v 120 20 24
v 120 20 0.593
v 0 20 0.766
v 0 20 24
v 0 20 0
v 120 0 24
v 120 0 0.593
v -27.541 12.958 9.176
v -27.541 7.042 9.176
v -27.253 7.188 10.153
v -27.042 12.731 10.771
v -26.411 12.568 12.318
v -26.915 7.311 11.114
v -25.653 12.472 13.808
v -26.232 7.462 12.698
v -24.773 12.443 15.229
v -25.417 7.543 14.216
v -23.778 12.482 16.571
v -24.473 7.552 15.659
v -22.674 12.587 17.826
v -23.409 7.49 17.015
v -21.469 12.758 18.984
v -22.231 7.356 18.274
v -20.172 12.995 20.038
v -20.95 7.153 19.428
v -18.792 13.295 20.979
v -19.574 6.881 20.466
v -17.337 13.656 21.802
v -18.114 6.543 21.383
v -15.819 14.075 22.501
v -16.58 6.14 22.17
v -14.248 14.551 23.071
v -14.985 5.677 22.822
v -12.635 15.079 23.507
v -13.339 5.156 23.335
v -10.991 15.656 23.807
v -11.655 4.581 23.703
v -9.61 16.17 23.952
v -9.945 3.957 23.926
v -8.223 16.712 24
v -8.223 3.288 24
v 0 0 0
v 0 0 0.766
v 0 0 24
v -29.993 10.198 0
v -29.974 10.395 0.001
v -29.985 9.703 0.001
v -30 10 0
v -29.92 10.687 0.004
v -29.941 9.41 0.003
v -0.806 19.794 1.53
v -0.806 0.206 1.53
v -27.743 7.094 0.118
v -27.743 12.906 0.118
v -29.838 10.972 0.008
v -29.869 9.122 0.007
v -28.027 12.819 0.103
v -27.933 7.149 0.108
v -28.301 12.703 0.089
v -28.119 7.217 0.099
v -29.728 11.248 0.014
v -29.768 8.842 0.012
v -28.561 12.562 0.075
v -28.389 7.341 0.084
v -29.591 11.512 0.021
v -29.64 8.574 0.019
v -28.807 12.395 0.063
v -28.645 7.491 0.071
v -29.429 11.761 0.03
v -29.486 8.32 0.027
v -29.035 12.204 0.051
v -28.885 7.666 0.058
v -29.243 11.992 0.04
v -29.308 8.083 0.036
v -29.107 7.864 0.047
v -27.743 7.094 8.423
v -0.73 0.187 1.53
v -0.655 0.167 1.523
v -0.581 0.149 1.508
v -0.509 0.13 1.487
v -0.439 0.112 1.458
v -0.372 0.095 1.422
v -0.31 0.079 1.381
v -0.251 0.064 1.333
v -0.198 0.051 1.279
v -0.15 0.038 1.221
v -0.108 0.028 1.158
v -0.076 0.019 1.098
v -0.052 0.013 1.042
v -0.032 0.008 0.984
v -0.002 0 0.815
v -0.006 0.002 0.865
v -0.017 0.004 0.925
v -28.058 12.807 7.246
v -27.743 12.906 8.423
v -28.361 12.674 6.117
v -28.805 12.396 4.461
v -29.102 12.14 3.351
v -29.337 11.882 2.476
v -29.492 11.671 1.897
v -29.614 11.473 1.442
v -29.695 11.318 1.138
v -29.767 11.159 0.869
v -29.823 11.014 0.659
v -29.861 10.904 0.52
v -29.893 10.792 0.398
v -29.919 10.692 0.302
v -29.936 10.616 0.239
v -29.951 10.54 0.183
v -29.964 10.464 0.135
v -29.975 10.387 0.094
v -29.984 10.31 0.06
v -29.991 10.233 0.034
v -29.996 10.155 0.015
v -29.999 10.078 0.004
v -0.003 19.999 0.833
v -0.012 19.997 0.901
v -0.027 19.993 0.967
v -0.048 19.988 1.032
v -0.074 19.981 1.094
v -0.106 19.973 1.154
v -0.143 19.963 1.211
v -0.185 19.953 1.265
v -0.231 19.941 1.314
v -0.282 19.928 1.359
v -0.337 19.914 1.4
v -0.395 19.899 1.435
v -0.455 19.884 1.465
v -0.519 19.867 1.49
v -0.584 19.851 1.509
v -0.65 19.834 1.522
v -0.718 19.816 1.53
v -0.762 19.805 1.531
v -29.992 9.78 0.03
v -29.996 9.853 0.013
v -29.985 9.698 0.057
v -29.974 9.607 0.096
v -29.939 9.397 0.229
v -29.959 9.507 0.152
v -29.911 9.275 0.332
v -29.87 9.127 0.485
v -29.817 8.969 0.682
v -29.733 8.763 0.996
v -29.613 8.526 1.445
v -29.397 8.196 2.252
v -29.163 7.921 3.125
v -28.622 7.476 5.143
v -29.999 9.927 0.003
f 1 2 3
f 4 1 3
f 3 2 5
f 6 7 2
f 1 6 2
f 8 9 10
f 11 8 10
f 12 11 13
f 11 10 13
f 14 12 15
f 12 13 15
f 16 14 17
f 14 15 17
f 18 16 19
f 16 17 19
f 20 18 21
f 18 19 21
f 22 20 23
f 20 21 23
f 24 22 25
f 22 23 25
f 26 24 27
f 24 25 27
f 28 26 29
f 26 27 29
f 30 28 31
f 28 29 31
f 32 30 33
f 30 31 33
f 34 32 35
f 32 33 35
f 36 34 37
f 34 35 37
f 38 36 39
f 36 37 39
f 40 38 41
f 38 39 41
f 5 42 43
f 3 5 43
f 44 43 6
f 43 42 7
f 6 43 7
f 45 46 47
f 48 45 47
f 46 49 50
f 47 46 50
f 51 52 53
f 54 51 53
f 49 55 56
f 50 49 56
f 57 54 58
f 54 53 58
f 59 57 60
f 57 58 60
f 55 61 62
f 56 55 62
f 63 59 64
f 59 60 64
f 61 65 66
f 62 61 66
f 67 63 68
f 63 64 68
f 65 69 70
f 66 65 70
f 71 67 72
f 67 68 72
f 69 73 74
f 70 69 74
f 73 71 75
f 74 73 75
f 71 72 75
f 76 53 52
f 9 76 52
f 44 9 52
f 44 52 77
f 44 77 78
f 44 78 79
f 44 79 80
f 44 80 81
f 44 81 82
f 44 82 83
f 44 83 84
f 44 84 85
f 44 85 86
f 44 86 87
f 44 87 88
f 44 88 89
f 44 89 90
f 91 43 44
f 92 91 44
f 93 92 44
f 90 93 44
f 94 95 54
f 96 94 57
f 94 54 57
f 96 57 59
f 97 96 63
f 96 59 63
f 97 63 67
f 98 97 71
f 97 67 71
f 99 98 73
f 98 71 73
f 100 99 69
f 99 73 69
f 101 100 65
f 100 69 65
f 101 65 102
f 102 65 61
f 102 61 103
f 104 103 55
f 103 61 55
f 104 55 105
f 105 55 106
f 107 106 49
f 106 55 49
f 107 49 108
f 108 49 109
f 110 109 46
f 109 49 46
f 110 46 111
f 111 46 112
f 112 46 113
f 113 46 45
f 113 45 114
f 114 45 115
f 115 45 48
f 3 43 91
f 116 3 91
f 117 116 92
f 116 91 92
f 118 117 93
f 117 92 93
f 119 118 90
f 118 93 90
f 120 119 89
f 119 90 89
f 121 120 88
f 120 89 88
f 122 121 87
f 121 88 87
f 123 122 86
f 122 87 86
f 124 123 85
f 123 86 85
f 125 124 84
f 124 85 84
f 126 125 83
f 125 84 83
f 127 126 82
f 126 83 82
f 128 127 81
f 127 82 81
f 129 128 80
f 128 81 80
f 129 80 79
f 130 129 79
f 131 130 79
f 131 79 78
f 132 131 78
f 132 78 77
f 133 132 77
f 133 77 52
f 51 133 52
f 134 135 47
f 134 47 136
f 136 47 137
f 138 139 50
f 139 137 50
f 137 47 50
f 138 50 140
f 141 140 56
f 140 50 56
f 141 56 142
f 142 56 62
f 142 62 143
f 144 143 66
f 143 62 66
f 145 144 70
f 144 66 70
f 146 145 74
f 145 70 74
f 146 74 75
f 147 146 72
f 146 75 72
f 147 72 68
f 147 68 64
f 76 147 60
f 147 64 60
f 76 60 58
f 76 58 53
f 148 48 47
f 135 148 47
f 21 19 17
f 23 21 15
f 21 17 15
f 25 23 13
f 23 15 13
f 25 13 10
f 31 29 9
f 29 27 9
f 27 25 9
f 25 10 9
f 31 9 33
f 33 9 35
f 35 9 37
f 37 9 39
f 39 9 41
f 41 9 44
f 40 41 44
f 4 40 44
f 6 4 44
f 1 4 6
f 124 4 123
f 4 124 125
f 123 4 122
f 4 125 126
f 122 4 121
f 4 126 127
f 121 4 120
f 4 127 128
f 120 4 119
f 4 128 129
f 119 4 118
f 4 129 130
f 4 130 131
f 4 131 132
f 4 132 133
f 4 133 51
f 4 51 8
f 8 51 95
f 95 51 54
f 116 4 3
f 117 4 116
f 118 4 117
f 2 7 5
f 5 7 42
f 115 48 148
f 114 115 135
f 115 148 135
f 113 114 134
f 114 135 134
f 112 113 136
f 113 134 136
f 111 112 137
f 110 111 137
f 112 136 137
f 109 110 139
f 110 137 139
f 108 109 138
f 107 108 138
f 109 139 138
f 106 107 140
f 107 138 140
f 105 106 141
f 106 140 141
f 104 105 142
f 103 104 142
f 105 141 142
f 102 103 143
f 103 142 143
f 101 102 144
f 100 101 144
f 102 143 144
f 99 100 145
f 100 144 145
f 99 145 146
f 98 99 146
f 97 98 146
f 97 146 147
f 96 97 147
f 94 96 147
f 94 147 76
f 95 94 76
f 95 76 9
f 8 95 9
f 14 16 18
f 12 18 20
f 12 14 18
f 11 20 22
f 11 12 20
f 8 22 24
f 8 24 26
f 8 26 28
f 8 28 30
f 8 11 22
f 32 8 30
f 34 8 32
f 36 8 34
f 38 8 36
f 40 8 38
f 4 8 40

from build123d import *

# Parameters (mm, degrees)
EXTRUDE_1_DEPTH     = 24
SKETCH_2_OUTSIDE_W  = 182.644
SKETCH_2_OUTSIDE_H  = 56.644
CUT_EXTRUDE_1_DEPTH = 24
SKETCH_6_W          = 43.637196822
SKETCH_6_H          = 35.300538325
CUT_EXTRUDE_2_DEPTH = 24


with BuildPart() as part:
    # Эскиз1 → Бобышка-Вытянуть1 (new body)
    with BuildSketch(Plane.XY):
        with BuildLine():
            Line((0, 0), (120, 0))
            Line((120, 0), (120, 20))
            Line((120, 20), (0, 20))
            Line((0, 20), (-27.743147483, 12.906498205))
            ThreePointArc((-27.743147483, 12.906498205), (-30, 10), (-27.743147483, 7.093501795))
            Line((-27.743147483, 7.093501795), (0, 0))
        make_face()
    extrude(amount=EXTRUDE_1_DEPTH)

    # Эскиз2 outside → Вырез-Вытянуть1 (cut)
    with BuildSketch(Plane(origin=(0, 0, 0), x_dir=(1, 0, 0), z_dir=(0, 1, 0))):
        with Locations((45, -12)):
            Rectangle(SKETCH_2_OUTSIDE_W, SKETCH_2_OUTSIDE_H)
        with BuildLine():
            Line((-30, 0), (-27.541196148, -9.176380902))
            ThreePointArc((-27.541196148, -9.176380902), (-20.397908202, -19.867066806), (-8.222679622, -24))
            Line((-8.222679622, -24), (0, -24))
            Line((0, -24), (155.035600822, -24))
            Line((155.035600822, -24), (155.035600822, -0.765531499))
            Line((155.035600822, -0.765531499), (0, 0))
            Line((0, 0), (0, -0.765531499))
            ThreePointArc((0, -0.765531499), (-0.238574389, -1.320828429), (-0.805596322, -1.530013864))
            Line((-0.805596322, -1.530013864), (-30, 0))
        make_face(mode=Mode.SUBTRACT)
    extrude(amount=CUT_EXTRUDE_1_DEPTH, mode=Mode.SUBTRACT)

    # Эскиз6 → Вырез-Вытянуть2 (cut)
    with BuildSketch(Plane(origin=(-8.581317892, 21.458428849, 5.749768681), x_dir=(0.9328250222338894, 0.34805174336163447, 0.09326018355799502), z_dir=(-0.36032967945250355, 0.9010397803843876, 0.24143288150231465))):
        with Locations((-5.019191461, -7.289608273)):
            Rectangle(SKETCH_6_W, SKETCH_6_H)
    cut_extrude_2 = extrude(amount=CUT_EXTRUDE_2_DEPTH, mode=Mode.SUBTRACT)

    # Зеркальное отражение1: Вырез-Вытянуть2 across plane
    add(cut_extrude_2.mirror(Plane(origin=(0, 10, 0), x_dir=(0, 0, 1), z_dir=(0, -1, 0))), mode=Mode.SUBTRACT)


solid = part.part
